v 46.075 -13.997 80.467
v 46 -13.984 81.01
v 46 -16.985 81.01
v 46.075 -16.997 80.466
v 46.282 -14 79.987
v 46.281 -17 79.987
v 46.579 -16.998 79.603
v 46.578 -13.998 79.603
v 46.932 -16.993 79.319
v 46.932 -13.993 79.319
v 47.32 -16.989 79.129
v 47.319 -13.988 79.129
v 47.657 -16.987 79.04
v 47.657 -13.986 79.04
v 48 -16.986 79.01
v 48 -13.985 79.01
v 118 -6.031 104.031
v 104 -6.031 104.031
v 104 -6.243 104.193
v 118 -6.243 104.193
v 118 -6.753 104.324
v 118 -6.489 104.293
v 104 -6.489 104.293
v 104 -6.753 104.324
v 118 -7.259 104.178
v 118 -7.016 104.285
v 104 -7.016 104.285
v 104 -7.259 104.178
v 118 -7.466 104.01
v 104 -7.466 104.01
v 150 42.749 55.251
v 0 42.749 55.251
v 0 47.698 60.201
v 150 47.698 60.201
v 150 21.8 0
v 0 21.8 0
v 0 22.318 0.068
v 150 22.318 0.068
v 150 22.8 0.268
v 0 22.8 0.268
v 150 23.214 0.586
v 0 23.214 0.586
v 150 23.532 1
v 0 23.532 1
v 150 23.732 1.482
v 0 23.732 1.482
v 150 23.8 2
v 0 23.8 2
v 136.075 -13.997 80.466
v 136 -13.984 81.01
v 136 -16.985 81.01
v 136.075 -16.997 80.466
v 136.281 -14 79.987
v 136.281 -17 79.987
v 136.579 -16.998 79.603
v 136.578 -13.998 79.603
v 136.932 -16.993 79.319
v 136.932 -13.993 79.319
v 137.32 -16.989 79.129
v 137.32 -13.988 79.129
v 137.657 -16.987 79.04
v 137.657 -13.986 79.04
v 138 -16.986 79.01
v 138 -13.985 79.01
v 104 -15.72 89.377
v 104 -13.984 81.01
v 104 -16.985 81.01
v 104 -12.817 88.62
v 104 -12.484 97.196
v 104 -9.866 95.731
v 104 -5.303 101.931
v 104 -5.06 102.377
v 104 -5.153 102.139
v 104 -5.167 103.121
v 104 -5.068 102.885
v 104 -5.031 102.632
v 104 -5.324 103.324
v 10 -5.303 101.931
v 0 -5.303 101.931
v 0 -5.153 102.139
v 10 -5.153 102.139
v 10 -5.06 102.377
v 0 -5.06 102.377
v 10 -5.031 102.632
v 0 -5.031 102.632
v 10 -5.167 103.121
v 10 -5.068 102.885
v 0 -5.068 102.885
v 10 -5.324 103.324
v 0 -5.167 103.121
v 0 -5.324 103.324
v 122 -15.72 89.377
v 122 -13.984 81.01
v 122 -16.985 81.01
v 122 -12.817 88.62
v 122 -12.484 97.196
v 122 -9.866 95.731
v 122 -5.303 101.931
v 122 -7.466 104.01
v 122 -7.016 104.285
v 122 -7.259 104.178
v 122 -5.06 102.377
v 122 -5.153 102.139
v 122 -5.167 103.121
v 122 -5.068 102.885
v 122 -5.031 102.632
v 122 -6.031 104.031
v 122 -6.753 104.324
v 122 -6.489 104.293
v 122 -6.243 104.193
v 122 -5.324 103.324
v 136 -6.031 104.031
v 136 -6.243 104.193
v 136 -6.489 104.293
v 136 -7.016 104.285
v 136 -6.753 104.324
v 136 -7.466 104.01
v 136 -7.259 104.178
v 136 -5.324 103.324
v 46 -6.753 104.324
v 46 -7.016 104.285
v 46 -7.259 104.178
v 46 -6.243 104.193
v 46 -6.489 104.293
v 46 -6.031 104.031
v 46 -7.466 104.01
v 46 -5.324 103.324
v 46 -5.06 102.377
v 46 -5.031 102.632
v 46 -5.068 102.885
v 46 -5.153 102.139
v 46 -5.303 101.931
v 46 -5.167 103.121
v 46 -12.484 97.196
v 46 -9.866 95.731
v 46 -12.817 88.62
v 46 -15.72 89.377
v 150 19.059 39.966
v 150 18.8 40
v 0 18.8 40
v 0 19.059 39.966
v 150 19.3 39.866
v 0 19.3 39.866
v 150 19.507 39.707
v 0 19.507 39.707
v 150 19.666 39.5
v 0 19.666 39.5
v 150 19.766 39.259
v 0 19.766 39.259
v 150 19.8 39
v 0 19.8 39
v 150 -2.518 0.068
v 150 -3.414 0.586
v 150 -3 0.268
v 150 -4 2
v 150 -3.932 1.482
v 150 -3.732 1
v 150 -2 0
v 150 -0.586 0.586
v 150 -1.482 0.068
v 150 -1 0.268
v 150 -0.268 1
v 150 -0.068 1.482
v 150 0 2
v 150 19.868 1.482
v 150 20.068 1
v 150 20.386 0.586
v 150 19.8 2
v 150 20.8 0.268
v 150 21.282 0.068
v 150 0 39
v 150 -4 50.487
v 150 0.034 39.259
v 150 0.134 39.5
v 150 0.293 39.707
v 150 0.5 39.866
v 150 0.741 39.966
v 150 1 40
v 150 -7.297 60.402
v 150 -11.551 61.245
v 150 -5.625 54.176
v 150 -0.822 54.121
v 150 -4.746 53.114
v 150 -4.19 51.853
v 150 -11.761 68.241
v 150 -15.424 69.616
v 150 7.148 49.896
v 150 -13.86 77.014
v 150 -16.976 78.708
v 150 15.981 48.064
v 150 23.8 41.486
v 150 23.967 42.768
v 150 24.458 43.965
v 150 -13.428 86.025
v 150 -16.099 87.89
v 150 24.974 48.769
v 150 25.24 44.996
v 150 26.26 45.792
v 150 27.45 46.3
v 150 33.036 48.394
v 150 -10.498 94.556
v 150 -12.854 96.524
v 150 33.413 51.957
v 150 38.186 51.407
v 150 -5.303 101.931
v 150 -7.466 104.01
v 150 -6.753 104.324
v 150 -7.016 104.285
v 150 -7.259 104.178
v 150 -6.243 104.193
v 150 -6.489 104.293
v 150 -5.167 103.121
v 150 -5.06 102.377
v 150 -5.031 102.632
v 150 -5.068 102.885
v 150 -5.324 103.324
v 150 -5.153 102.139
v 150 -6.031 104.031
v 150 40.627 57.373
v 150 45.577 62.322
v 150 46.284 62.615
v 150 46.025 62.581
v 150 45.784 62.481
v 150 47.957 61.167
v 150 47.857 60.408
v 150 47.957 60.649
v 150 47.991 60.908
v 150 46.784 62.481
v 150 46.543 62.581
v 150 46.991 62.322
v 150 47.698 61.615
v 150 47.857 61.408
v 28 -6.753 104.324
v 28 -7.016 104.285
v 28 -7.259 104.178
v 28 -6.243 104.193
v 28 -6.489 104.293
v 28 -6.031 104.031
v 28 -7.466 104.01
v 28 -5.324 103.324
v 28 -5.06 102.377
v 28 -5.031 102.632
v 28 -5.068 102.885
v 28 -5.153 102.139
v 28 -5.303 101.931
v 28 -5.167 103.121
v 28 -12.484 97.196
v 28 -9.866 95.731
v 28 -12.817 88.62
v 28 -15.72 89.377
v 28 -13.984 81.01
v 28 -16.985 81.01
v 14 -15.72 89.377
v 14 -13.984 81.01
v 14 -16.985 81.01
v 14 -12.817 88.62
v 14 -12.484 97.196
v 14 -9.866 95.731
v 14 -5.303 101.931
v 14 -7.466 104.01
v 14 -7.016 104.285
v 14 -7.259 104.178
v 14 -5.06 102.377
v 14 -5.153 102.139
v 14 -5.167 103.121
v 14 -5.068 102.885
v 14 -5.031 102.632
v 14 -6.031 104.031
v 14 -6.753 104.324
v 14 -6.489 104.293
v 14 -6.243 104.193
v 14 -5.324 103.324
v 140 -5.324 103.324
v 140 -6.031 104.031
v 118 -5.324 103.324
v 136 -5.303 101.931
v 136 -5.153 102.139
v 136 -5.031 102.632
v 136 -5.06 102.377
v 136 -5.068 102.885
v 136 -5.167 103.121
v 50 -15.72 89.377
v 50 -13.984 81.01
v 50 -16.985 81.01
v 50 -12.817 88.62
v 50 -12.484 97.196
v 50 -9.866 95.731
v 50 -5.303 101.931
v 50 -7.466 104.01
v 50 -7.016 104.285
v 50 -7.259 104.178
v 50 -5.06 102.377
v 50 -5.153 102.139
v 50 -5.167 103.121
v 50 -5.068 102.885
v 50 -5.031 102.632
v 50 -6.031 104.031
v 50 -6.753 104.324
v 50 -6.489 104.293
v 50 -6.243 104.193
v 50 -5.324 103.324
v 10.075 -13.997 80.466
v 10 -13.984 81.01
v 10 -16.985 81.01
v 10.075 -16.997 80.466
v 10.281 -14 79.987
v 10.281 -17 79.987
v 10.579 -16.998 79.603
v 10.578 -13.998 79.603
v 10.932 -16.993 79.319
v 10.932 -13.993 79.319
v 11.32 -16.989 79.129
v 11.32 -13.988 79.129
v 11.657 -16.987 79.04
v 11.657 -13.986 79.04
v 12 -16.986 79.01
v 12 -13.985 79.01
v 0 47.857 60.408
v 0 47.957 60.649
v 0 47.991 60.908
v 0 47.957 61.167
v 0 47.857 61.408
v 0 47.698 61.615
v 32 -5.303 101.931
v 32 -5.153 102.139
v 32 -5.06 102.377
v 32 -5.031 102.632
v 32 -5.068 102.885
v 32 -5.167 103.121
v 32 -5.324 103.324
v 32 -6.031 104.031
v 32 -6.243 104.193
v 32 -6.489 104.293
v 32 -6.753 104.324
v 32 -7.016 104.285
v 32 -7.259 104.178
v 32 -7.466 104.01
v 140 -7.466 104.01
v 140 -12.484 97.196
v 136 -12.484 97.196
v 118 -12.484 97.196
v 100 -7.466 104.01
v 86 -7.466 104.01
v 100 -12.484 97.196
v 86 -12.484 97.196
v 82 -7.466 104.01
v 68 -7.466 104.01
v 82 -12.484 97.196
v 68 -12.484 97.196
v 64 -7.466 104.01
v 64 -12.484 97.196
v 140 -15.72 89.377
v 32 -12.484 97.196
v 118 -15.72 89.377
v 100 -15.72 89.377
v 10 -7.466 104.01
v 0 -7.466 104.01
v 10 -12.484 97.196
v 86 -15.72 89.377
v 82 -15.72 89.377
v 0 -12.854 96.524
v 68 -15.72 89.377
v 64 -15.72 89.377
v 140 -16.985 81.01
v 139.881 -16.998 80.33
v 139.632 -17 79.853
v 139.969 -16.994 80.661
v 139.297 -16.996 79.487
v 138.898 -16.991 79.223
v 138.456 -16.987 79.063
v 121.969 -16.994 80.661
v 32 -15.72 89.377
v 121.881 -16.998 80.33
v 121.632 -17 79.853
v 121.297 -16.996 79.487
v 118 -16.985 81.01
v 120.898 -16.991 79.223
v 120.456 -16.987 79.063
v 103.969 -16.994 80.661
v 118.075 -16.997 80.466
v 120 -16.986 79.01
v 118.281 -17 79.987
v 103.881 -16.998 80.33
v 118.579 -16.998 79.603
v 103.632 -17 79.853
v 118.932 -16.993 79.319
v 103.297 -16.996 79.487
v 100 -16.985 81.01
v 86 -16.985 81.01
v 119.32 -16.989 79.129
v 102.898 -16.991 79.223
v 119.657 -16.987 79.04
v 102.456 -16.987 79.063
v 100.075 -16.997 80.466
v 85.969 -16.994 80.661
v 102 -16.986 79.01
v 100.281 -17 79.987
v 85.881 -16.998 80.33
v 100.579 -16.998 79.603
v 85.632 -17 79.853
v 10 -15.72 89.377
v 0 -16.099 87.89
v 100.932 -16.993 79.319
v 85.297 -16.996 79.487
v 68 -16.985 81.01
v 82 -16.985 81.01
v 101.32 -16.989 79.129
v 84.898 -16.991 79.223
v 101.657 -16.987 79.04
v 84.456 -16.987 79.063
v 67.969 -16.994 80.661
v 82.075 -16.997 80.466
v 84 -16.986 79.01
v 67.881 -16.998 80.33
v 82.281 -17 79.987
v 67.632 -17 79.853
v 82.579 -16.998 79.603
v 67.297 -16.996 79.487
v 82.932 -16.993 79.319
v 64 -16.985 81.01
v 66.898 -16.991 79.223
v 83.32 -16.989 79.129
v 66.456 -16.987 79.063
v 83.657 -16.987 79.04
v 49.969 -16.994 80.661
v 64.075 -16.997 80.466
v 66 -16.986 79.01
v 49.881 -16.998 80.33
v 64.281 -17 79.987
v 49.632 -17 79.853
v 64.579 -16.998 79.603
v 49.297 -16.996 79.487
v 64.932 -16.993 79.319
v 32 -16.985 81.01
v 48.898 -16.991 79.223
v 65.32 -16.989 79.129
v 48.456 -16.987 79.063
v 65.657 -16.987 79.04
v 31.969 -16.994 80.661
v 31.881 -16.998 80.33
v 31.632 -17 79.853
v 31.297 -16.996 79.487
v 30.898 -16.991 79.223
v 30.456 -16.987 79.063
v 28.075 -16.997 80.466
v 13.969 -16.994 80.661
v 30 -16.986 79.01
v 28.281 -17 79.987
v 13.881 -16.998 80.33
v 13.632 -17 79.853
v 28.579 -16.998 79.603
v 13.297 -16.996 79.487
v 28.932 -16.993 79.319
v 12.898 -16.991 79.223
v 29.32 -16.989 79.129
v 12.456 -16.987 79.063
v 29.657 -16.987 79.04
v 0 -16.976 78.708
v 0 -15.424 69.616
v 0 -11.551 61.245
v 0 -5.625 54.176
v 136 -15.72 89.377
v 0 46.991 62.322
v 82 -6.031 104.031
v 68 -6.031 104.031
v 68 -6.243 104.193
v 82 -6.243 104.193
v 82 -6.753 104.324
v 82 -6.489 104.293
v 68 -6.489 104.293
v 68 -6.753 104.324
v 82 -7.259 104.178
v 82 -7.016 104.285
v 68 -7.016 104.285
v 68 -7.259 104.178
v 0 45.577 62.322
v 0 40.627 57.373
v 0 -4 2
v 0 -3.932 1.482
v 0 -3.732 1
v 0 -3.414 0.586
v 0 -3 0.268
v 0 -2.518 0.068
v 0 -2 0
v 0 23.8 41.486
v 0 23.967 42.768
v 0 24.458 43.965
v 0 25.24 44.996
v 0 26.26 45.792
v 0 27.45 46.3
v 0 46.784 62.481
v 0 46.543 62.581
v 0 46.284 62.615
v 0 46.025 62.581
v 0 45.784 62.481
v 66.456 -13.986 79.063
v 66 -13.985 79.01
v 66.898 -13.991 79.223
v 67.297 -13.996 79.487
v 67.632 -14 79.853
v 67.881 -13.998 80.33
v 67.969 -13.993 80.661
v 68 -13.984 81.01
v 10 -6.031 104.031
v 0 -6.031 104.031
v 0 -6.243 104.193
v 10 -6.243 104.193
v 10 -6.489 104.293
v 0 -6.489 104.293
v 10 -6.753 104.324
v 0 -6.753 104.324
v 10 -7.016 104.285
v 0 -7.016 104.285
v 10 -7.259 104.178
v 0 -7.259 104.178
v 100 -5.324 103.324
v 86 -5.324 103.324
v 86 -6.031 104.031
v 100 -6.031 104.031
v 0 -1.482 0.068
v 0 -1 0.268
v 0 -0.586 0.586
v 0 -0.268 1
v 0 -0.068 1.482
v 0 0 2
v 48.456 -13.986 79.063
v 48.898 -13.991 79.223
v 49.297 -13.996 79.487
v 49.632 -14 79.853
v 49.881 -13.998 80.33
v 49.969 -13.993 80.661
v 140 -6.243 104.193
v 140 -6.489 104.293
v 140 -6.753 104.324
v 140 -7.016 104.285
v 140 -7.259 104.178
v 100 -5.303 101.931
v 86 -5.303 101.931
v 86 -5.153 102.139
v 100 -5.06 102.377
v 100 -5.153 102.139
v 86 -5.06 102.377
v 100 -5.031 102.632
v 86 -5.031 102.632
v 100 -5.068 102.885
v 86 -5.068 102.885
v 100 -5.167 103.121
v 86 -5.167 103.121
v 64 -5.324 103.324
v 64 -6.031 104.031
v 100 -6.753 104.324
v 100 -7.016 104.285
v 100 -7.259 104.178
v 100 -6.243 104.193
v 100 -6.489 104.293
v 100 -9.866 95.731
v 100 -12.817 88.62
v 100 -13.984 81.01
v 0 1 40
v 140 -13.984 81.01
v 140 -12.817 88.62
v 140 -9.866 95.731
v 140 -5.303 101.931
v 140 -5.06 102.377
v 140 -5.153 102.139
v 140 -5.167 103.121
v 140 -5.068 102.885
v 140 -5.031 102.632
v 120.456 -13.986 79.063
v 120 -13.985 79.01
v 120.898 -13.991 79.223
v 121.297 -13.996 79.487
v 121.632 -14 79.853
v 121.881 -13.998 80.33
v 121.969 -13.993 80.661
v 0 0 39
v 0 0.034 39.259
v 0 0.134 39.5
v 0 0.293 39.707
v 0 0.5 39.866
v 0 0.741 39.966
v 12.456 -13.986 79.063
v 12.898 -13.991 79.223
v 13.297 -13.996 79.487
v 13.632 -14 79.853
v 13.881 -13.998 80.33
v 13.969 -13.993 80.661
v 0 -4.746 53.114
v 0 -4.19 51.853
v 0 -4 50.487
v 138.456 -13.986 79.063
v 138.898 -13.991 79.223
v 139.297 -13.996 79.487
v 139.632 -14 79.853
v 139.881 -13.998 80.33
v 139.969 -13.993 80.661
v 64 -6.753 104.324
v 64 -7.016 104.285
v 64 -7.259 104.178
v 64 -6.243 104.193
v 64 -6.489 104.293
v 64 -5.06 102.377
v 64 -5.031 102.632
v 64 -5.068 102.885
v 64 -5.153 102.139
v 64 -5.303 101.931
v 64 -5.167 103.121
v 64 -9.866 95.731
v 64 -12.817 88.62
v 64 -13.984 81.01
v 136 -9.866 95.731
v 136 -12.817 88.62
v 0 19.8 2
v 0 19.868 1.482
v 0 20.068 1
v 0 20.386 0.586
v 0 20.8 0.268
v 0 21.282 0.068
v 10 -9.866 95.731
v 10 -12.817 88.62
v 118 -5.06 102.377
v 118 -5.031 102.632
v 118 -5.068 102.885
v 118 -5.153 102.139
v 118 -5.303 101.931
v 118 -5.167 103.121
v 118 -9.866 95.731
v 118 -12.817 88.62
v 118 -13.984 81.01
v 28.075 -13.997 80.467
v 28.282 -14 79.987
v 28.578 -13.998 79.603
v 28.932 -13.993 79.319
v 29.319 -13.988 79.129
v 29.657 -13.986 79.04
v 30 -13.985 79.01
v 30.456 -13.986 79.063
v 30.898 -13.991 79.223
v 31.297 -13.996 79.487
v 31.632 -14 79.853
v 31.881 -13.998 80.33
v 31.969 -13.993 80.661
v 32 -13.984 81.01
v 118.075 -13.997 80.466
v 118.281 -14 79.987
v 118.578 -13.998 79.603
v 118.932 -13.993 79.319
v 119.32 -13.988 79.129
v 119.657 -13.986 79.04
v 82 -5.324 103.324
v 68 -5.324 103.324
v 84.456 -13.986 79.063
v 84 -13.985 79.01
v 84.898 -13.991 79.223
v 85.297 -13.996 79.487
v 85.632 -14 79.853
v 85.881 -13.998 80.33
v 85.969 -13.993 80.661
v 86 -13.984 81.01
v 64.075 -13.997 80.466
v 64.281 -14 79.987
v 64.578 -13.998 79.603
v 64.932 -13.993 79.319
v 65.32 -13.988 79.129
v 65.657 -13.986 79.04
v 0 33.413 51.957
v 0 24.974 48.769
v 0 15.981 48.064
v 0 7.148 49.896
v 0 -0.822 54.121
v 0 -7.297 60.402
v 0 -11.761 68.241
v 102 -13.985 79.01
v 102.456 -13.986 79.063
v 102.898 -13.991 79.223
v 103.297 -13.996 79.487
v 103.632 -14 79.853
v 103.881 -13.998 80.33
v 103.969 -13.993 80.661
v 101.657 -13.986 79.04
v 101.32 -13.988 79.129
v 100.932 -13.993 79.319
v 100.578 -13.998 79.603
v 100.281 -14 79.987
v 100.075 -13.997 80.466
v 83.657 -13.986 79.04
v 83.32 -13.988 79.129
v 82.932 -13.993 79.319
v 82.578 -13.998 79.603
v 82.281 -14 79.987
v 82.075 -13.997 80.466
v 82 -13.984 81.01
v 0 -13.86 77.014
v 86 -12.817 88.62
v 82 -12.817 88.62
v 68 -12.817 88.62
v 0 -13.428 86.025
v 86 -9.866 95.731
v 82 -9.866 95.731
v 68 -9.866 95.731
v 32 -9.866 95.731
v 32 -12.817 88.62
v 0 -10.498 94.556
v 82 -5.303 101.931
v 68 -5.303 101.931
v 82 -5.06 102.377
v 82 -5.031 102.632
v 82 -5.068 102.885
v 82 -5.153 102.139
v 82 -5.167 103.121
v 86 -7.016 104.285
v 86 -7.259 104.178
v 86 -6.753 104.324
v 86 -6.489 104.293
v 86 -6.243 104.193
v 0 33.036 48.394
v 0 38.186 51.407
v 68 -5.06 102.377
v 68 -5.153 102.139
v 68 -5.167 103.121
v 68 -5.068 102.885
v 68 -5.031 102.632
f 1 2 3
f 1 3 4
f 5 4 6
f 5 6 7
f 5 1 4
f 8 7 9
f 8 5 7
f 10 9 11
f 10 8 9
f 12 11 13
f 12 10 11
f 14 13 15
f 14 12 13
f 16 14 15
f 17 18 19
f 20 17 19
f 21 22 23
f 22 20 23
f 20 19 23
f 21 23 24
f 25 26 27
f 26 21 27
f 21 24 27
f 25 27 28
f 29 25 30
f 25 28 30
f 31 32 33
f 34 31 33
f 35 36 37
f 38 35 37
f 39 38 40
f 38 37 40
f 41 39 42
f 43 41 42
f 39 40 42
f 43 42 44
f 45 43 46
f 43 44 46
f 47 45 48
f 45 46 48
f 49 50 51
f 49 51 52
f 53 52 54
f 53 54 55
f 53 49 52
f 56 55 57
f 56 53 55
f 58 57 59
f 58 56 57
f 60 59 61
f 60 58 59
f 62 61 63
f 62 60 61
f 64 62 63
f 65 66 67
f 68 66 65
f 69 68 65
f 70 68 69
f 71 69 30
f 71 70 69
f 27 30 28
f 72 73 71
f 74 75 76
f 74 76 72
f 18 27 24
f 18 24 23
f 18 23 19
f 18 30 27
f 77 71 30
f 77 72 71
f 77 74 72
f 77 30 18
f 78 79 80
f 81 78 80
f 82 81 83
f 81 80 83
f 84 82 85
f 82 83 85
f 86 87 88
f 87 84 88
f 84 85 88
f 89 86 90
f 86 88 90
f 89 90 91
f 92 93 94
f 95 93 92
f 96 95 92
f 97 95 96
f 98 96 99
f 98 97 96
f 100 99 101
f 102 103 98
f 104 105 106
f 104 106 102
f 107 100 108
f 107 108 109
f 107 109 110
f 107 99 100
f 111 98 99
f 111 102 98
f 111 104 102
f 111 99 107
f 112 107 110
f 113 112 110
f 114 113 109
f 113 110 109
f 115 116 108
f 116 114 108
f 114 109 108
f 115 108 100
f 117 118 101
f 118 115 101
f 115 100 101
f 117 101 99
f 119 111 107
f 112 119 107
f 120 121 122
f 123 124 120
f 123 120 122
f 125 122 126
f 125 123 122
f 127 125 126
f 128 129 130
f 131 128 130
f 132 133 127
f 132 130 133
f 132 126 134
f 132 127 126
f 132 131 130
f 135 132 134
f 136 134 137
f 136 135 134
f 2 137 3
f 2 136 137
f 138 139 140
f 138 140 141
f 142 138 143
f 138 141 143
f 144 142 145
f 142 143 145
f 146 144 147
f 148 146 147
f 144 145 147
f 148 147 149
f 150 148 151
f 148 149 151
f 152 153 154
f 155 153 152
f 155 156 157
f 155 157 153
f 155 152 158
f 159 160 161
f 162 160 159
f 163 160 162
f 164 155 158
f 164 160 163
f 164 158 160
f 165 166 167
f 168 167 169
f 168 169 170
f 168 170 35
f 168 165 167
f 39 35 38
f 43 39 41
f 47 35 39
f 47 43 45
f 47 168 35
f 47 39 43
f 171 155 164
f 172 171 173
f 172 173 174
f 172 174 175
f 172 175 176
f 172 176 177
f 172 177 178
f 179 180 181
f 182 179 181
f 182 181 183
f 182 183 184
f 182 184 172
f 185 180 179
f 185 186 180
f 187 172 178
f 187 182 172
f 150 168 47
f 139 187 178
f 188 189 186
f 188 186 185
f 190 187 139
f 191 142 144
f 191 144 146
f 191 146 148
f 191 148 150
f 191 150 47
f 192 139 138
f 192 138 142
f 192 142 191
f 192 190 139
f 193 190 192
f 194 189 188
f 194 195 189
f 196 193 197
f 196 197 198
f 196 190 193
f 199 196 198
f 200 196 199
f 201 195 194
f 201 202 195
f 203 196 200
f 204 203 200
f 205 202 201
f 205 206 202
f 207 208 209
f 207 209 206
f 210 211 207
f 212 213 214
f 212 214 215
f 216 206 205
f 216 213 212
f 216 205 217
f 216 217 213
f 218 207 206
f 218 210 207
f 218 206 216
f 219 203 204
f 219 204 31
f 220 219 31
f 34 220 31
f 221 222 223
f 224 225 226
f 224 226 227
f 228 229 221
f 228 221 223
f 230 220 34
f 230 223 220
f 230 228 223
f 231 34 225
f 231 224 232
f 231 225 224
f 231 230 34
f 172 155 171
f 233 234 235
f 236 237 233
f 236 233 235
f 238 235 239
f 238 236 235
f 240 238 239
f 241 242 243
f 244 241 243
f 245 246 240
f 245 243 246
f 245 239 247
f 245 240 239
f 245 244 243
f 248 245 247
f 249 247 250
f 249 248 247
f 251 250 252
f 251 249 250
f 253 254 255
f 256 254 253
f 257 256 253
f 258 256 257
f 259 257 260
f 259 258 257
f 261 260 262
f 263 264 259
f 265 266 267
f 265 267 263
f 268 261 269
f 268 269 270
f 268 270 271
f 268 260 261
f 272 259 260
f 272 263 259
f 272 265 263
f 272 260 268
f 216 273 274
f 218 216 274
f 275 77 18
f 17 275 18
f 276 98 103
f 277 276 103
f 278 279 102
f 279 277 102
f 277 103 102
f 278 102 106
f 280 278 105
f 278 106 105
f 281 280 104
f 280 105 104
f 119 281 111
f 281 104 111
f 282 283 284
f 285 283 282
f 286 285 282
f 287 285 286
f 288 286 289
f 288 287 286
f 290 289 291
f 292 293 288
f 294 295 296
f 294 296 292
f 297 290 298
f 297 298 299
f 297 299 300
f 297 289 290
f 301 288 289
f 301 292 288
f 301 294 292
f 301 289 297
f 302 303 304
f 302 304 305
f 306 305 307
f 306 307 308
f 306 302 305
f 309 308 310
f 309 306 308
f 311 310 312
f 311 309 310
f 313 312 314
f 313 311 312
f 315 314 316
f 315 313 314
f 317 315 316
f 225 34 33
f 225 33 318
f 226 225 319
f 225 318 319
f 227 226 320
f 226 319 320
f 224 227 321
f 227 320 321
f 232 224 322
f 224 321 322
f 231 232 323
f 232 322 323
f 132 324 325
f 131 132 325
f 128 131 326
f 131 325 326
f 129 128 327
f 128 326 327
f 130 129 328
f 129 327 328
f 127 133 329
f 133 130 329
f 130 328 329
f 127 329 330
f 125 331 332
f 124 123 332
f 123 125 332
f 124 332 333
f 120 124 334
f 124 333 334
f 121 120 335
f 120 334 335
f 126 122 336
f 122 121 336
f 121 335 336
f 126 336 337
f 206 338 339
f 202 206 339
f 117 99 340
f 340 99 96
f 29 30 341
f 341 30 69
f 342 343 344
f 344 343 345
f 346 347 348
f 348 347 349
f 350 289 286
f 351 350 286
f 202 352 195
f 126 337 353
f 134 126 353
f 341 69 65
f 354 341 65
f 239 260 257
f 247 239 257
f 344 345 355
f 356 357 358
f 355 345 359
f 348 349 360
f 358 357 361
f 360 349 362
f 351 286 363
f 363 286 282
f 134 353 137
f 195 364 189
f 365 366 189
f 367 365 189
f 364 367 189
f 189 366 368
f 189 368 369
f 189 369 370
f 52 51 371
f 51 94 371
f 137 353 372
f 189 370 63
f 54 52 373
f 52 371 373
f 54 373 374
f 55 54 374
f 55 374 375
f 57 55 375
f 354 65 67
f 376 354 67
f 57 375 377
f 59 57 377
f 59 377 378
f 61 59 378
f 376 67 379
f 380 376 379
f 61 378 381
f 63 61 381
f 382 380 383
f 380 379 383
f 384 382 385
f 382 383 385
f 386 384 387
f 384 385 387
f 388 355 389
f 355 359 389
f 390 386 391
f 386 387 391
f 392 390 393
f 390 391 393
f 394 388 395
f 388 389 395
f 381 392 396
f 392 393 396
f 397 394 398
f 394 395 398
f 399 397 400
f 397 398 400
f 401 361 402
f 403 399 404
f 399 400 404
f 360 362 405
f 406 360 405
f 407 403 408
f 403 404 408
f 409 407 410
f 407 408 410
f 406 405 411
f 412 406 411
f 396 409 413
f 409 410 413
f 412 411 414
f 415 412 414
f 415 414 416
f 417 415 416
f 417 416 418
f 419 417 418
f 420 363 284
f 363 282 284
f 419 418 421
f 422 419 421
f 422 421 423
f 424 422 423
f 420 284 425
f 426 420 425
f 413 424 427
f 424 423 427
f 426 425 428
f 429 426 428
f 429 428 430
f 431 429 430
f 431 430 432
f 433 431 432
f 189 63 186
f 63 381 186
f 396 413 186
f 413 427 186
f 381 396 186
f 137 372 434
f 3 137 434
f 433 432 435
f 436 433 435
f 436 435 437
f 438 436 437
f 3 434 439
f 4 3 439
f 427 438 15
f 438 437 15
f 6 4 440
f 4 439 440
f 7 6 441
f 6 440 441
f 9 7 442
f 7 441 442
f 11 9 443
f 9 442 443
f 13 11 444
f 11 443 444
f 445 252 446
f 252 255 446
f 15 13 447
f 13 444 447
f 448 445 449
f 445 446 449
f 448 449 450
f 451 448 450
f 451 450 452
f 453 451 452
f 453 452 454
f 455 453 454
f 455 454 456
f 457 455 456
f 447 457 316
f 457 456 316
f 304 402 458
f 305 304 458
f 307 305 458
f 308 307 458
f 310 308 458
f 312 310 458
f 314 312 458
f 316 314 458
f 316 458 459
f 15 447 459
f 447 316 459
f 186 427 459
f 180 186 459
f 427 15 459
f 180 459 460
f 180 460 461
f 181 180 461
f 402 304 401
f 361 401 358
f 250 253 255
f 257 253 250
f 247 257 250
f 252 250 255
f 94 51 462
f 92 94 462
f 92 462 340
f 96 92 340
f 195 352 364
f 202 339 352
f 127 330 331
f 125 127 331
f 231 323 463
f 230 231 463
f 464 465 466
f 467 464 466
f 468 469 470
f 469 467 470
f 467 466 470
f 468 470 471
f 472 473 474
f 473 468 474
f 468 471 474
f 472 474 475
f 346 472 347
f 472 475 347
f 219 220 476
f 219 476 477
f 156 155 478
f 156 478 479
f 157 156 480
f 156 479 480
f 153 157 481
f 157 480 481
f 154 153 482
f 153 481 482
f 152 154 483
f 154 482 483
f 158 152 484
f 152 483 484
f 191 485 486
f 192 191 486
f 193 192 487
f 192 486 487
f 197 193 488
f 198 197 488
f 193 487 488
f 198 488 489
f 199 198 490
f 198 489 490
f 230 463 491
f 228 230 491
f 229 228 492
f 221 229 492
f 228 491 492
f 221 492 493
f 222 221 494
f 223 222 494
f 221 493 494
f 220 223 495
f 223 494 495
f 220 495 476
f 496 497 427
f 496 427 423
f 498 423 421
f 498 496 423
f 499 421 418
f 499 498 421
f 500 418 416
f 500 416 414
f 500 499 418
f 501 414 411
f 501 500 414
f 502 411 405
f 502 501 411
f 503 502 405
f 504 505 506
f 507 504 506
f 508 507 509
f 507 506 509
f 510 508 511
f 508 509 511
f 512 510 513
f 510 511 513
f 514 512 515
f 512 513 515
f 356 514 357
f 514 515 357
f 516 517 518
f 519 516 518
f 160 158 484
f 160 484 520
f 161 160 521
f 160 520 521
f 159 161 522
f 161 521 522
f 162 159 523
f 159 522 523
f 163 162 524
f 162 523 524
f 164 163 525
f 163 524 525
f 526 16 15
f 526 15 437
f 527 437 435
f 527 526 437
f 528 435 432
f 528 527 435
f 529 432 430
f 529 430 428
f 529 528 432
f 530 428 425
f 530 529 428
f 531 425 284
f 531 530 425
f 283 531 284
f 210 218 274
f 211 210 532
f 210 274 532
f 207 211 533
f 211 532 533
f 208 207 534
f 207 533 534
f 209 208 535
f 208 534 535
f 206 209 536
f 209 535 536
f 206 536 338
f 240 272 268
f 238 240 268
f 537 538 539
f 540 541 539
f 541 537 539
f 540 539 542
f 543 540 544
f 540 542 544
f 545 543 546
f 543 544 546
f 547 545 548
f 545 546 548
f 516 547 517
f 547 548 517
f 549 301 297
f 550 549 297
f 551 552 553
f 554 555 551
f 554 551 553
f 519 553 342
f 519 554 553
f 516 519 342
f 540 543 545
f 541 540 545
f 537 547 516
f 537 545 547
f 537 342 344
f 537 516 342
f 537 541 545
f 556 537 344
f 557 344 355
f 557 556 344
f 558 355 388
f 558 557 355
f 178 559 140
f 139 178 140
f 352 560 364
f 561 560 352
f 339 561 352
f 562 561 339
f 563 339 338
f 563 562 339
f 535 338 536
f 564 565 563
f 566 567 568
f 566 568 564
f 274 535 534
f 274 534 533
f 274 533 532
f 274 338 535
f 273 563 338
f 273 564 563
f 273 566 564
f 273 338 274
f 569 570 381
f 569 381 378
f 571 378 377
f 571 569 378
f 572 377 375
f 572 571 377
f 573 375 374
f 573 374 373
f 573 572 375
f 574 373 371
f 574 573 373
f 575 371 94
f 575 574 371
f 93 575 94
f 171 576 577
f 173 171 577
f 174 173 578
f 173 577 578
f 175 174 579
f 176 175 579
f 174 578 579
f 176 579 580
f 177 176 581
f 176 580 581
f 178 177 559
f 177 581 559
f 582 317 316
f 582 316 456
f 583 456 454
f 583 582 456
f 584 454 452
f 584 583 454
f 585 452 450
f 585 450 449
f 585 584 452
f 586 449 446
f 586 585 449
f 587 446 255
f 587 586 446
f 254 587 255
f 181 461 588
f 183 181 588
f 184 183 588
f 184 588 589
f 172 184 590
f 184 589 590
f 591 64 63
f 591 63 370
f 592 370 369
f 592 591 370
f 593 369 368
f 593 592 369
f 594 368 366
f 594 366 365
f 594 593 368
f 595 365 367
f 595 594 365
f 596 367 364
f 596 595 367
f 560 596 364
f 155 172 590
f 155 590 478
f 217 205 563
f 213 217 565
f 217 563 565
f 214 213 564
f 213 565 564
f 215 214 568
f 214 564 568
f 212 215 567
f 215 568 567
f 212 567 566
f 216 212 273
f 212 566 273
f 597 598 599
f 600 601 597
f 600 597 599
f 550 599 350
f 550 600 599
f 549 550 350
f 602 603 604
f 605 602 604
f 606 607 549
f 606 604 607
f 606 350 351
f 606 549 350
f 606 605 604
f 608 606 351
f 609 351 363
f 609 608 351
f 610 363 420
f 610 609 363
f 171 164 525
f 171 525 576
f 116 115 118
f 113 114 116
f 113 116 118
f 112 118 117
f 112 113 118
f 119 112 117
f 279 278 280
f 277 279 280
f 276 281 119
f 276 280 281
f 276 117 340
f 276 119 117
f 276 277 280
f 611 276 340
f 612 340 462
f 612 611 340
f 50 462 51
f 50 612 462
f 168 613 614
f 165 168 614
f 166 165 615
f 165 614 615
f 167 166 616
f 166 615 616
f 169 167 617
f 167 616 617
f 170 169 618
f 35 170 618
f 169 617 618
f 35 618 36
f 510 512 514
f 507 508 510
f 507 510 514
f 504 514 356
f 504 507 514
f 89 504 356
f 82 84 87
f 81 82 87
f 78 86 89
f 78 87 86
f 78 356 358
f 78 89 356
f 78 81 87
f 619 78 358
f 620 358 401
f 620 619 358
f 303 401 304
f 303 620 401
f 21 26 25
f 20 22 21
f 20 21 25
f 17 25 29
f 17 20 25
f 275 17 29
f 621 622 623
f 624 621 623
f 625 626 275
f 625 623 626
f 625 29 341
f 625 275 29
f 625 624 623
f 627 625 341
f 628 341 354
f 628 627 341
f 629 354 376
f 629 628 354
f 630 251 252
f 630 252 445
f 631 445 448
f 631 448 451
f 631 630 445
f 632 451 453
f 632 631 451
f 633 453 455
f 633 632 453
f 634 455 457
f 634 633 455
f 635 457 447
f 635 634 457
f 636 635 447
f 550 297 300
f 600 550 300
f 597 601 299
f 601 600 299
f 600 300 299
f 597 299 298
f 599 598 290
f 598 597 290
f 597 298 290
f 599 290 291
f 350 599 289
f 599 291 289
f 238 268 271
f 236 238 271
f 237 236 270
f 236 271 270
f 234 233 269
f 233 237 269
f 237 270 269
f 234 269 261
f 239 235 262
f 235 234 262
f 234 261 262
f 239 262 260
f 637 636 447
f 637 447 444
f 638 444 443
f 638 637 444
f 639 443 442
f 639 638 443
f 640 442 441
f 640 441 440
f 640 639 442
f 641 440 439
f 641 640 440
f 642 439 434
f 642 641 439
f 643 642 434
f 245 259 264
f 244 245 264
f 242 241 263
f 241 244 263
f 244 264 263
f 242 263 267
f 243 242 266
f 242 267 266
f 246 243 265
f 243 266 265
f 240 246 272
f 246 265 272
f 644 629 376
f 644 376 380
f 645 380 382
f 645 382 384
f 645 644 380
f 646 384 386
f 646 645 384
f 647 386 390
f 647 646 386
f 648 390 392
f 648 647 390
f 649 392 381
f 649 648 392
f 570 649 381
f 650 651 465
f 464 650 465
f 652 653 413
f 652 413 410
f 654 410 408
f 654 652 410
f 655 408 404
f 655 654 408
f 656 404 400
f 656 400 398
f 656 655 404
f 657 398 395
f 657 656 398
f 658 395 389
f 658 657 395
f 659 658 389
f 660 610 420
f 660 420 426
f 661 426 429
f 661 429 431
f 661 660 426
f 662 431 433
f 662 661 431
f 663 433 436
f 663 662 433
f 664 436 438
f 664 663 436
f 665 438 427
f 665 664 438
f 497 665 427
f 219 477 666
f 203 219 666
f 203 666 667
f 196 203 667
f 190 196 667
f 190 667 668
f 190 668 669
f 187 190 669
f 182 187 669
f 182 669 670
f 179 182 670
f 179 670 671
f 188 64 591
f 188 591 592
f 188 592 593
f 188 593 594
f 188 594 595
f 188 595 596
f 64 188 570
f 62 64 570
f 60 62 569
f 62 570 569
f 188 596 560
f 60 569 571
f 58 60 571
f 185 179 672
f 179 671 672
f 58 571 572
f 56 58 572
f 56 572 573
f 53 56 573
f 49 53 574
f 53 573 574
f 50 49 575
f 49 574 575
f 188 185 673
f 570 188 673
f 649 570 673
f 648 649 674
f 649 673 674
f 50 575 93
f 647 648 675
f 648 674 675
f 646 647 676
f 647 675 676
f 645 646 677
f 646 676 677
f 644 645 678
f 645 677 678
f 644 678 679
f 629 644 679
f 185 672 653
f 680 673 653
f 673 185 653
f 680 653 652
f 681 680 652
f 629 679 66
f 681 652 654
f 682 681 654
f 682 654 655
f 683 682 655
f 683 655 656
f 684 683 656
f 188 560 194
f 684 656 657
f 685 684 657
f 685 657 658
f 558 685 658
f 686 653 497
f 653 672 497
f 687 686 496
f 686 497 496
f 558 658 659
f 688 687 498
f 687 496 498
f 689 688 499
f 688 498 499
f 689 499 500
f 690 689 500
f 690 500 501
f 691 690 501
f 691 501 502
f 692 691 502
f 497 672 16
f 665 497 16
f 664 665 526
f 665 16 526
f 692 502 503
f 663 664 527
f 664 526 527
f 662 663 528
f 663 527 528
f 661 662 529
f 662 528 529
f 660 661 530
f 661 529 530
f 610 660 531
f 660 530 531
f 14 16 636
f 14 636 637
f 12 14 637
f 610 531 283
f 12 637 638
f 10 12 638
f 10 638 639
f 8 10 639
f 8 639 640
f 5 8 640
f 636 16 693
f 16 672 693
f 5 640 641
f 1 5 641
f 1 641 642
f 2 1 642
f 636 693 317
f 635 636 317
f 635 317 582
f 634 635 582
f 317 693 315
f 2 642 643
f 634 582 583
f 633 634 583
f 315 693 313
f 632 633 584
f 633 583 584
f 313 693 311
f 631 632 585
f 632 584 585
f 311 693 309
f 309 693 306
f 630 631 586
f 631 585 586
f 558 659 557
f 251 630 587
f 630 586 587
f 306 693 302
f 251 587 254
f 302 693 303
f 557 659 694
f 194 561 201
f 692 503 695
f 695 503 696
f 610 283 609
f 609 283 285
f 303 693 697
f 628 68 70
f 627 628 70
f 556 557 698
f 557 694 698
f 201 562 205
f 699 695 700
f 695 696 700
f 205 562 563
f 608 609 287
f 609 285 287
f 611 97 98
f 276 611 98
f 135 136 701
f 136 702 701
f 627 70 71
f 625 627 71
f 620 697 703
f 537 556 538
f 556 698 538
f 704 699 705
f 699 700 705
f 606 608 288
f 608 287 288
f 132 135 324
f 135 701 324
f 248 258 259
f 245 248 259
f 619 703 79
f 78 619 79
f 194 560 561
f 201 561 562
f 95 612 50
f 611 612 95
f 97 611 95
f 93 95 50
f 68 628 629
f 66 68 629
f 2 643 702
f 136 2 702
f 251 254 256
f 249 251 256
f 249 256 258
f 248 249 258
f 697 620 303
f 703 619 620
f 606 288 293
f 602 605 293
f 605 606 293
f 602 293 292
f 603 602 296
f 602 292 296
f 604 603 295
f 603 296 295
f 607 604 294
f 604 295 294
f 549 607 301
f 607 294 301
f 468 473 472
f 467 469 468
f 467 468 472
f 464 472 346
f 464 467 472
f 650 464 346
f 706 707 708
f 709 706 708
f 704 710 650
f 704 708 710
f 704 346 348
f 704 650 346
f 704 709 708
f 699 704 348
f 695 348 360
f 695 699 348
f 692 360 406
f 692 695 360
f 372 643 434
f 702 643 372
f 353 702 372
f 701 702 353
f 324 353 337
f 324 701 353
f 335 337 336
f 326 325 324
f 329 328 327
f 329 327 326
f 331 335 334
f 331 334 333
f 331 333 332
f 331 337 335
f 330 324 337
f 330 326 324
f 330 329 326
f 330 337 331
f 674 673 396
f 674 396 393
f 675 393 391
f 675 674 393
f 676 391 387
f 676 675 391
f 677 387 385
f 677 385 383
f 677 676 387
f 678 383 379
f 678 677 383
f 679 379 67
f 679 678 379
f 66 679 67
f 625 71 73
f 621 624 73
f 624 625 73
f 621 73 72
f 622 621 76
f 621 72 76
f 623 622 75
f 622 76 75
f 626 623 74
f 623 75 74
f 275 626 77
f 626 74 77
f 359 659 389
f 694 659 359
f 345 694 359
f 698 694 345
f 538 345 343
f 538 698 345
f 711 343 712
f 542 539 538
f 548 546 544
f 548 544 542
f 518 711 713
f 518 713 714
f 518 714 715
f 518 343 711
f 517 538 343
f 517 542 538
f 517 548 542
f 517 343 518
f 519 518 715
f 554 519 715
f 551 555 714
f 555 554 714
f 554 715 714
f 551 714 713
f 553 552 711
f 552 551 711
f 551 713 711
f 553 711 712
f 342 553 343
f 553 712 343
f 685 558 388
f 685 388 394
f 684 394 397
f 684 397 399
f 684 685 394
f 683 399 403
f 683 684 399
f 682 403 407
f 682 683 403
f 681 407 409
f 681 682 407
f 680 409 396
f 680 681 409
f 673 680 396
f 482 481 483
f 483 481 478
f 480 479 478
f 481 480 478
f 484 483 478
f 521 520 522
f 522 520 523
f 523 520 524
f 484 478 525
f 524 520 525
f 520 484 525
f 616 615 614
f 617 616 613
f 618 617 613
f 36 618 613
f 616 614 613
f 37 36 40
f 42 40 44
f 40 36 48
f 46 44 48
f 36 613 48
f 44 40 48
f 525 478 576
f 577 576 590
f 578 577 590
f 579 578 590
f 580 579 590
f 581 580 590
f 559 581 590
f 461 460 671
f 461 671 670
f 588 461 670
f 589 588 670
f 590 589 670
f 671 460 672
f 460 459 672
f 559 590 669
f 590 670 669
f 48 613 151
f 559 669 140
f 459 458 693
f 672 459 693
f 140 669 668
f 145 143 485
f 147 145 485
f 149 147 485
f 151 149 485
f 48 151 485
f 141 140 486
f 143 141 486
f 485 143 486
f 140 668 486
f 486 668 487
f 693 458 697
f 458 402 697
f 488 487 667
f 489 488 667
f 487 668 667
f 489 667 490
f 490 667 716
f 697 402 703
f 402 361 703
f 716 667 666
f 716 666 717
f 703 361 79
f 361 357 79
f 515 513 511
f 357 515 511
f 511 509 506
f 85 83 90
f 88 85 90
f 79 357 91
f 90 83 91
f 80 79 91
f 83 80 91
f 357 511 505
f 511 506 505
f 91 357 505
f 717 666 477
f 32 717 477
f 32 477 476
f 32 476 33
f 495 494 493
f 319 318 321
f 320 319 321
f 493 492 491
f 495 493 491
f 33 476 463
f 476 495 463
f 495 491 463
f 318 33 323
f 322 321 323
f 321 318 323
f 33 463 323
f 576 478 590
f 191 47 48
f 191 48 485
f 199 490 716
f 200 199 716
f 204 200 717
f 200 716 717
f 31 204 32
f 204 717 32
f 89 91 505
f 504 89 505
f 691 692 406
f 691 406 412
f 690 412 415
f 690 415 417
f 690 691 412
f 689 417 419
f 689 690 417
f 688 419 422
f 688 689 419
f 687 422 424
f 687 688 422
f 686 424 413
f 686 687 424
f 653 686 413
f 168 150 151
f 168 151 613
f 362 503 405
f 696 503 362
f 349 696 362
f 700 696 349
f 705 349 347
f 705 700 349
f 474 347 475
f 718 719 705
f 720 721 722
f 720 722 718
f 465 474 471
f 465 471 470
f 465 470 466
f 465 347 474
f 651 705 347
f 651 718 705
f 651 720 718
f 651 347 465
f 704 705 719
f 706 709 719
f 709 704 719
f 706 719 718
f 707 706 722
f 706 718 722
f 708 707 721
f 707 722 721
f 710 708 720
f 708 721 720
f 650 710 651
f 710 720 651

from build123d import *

# Parameters (mm, degrees)
F1_DEPTH = 150
F3_DEPTH = 25


with BuildPart() as f1:
    # F0 (on Right) → F1 (new body)
    with BuildSketch(Plane.YZ):
        with BuildLine():
            ThreePointArc((0, 39), (0.292893, 39.707107), (1, 40))
            Line((1, 40), (18.8, 40))
            ThreePointArc((18.8, 40), (19.507107, 39.707107), (19.8, 39))
            Line((19.8, 39), (19.8, 2))
            ThreePointArc((19.8, 2), (20.385786, 0.585786), (21.8, 0))
            ThreePointArc((21.8, 0), (23.214214, 0.585786), (23.8, 2))
            Line((23.8, 2), (23.8, 41.485587))
            ThreePointArc((23.8, 41.485587), (24.815656, 44.506349), (27.45, 46.299889))
            ThreePointArc((27.45, 46.299889), (35.675412, 49.791064), (42.748737, 55.251263))
            Line((42.748737, 55.251263), (47.698485, 60.20101))
            ThreePointArc((47.698485, 60.20101), (47.991378, 60.908117), (47.698485, 61.615224))
            Line((47.698485, 61.615224), (46.991378, 62.32233))
            ThreePointArc((46.991378, 62.32233), (46.284271, 62.615224), (45.577164, 62.32233))
            Line((45.577164, 62.32233), (40.627417, 57.372583))
            ThreePointArc((40.627417, 57.372583), (-4.28194, 57.032302), (-5.302705, 101.931346))
            ThreePointArc((-5.302705, 101.931346), (-5.031029, 102.631854), (-5.323808, 103.323808))
            Line((-5.323808, 103.323808), (-6.03123, 104.03123))
            ThreePointArc((-6.03123, 104.03123), (-6.753044, 104.324015), (-7.465935, 104.010127))
            ThreePointArc((-7.465935, 104.010127), (-16.976143, 78.707928), (-5.625, 54.17638))
            ThreePointArc((-5.625, 54.17638), (-4.424249, 52.502855), (-4, 50.487291))
            Line((-4, 50.487291), (-4, 2))
            ThreePointArc((-4, 2), (-3.414214, 0.585786), (-2, 0))
            ThreePointArc((-2, 0), (-0.585786, 0.585786), (0, 2))
            Line((0, 2), (0, 39))
        make_face()
    extrude(amount=F1_DEPTH)

    # F2 (on Front) → F3 (cut)
    with BuildSketch(Plane.XZ):
        with BuildLine():
            Line((14, 114.010127), (10, 114.010127))
            Line((10, 114.010127), (10, 81.010127))
            ThreePointArc((10, 81.010127), (10.585786, 79.595913), (12, 79.010127))
            ThreePointArc((12, 79.010127), (13.414214, 79.595913), (14, 81.010127))
            Line((14, 81.010127), (14, 114.010127))
        make_face()
        with BuildLine():
            Line((32, 81.010127), (32, 114.010127))
            Line((32, 114.010127), (28, 114.010127))
            Line((28, 114.010127), (28, 81.010127))
            ThreePointArc((28, 81.010127), (28.585786, 79.595913), (30, 79.010127))
            ThreePointArc((30, 79.010127), (31.414214, 79.595913), (32, 81.010127))
        make_face()
        with BuildLine():
            Line((50, 81.010127), (50, 114.010127))
            Line((50, 114.010127), (46, 114.010127))
            Line((46, 114.010127), (46, 81.010127))
            ThreePointArc((46, 81.010127), (46.585786, 79.595913), (48, 79.010127))
            ThreePointArc((48, 79.010127), (49.414214, 79.595913), (50, 81.010127))
        make_face()
        with BuildLine():
            Line((68, 81.010127), (68, 114.010127))
            Line((68, 114.010127), (64, 114.010127))
            Line((64, 114.010127), (64, 81.010127))
            ThreePointArc((64, 81.010127), (64.585786, 79.595913), (66, 79.010127))
            ThreePointArc((66, 79.010127), (67.414214, 79.595913), (68, 81.010127))
        make_face()
        with BuildLine():
            Line((86, 81.010127), (86, 114.010127))
            Line((86, 114.010127), (82, 114.010127))
            Line((82, 114.010127), (82, 81.010127))
            ThreePointArc((82, 81.010127), (82.585786, 79.595913), (84, 79.010127))
            ThreePointArc((84, 79.010127), (85.414214, 79.595913), (86, 81.010127))
        make_face()
        with BuildLine():
            Line((104, 81.010127), (104, 114.010127))
            Line((104, 114.010127), (100, 114.010127))
            Line((100, 114.010127), (100, 81.010127))
            ThreePointArc((100, 81.010127), (100.585786, 79.595913), (102, 79.010127))
            ThreePointArc((102, 79.010127), (103.414214, 79.595913), (104, 81.010127))
        make_face()
        with BuildLine():
            Line((122, 81.010127), (122, 114.010127))
            Line((122, 114.010127), (118, 114.010127))
            Line((118, 114.010127), (118, 81.010127))
            ThreePointArc((118, 81.010127), (118.585786, 79.595913), (120, 79.010127))
            ThreePointArc((120, 79.010127), (121.414214, 79.595913), (122, 81.010127))
        make_face()
        with BuildLine():
            Line((140, 81.010127), (140, 114.010127))
            Line((140, 114.010127), (136, 114.010127))
            Line((136, 114.010127), (136, 81.010127))
            ThreePointArc((136, 81.010127), (136.585786, 79.595913), (138, 79.010127))
            ThreePointArc((138, 79.010127), (139.414214, 79.595913), (140, 81.010127))
        make_face()
    extrude(amount=F3_DEPTH, mode=Mode.SUBTRACT)


solid = f1.part
